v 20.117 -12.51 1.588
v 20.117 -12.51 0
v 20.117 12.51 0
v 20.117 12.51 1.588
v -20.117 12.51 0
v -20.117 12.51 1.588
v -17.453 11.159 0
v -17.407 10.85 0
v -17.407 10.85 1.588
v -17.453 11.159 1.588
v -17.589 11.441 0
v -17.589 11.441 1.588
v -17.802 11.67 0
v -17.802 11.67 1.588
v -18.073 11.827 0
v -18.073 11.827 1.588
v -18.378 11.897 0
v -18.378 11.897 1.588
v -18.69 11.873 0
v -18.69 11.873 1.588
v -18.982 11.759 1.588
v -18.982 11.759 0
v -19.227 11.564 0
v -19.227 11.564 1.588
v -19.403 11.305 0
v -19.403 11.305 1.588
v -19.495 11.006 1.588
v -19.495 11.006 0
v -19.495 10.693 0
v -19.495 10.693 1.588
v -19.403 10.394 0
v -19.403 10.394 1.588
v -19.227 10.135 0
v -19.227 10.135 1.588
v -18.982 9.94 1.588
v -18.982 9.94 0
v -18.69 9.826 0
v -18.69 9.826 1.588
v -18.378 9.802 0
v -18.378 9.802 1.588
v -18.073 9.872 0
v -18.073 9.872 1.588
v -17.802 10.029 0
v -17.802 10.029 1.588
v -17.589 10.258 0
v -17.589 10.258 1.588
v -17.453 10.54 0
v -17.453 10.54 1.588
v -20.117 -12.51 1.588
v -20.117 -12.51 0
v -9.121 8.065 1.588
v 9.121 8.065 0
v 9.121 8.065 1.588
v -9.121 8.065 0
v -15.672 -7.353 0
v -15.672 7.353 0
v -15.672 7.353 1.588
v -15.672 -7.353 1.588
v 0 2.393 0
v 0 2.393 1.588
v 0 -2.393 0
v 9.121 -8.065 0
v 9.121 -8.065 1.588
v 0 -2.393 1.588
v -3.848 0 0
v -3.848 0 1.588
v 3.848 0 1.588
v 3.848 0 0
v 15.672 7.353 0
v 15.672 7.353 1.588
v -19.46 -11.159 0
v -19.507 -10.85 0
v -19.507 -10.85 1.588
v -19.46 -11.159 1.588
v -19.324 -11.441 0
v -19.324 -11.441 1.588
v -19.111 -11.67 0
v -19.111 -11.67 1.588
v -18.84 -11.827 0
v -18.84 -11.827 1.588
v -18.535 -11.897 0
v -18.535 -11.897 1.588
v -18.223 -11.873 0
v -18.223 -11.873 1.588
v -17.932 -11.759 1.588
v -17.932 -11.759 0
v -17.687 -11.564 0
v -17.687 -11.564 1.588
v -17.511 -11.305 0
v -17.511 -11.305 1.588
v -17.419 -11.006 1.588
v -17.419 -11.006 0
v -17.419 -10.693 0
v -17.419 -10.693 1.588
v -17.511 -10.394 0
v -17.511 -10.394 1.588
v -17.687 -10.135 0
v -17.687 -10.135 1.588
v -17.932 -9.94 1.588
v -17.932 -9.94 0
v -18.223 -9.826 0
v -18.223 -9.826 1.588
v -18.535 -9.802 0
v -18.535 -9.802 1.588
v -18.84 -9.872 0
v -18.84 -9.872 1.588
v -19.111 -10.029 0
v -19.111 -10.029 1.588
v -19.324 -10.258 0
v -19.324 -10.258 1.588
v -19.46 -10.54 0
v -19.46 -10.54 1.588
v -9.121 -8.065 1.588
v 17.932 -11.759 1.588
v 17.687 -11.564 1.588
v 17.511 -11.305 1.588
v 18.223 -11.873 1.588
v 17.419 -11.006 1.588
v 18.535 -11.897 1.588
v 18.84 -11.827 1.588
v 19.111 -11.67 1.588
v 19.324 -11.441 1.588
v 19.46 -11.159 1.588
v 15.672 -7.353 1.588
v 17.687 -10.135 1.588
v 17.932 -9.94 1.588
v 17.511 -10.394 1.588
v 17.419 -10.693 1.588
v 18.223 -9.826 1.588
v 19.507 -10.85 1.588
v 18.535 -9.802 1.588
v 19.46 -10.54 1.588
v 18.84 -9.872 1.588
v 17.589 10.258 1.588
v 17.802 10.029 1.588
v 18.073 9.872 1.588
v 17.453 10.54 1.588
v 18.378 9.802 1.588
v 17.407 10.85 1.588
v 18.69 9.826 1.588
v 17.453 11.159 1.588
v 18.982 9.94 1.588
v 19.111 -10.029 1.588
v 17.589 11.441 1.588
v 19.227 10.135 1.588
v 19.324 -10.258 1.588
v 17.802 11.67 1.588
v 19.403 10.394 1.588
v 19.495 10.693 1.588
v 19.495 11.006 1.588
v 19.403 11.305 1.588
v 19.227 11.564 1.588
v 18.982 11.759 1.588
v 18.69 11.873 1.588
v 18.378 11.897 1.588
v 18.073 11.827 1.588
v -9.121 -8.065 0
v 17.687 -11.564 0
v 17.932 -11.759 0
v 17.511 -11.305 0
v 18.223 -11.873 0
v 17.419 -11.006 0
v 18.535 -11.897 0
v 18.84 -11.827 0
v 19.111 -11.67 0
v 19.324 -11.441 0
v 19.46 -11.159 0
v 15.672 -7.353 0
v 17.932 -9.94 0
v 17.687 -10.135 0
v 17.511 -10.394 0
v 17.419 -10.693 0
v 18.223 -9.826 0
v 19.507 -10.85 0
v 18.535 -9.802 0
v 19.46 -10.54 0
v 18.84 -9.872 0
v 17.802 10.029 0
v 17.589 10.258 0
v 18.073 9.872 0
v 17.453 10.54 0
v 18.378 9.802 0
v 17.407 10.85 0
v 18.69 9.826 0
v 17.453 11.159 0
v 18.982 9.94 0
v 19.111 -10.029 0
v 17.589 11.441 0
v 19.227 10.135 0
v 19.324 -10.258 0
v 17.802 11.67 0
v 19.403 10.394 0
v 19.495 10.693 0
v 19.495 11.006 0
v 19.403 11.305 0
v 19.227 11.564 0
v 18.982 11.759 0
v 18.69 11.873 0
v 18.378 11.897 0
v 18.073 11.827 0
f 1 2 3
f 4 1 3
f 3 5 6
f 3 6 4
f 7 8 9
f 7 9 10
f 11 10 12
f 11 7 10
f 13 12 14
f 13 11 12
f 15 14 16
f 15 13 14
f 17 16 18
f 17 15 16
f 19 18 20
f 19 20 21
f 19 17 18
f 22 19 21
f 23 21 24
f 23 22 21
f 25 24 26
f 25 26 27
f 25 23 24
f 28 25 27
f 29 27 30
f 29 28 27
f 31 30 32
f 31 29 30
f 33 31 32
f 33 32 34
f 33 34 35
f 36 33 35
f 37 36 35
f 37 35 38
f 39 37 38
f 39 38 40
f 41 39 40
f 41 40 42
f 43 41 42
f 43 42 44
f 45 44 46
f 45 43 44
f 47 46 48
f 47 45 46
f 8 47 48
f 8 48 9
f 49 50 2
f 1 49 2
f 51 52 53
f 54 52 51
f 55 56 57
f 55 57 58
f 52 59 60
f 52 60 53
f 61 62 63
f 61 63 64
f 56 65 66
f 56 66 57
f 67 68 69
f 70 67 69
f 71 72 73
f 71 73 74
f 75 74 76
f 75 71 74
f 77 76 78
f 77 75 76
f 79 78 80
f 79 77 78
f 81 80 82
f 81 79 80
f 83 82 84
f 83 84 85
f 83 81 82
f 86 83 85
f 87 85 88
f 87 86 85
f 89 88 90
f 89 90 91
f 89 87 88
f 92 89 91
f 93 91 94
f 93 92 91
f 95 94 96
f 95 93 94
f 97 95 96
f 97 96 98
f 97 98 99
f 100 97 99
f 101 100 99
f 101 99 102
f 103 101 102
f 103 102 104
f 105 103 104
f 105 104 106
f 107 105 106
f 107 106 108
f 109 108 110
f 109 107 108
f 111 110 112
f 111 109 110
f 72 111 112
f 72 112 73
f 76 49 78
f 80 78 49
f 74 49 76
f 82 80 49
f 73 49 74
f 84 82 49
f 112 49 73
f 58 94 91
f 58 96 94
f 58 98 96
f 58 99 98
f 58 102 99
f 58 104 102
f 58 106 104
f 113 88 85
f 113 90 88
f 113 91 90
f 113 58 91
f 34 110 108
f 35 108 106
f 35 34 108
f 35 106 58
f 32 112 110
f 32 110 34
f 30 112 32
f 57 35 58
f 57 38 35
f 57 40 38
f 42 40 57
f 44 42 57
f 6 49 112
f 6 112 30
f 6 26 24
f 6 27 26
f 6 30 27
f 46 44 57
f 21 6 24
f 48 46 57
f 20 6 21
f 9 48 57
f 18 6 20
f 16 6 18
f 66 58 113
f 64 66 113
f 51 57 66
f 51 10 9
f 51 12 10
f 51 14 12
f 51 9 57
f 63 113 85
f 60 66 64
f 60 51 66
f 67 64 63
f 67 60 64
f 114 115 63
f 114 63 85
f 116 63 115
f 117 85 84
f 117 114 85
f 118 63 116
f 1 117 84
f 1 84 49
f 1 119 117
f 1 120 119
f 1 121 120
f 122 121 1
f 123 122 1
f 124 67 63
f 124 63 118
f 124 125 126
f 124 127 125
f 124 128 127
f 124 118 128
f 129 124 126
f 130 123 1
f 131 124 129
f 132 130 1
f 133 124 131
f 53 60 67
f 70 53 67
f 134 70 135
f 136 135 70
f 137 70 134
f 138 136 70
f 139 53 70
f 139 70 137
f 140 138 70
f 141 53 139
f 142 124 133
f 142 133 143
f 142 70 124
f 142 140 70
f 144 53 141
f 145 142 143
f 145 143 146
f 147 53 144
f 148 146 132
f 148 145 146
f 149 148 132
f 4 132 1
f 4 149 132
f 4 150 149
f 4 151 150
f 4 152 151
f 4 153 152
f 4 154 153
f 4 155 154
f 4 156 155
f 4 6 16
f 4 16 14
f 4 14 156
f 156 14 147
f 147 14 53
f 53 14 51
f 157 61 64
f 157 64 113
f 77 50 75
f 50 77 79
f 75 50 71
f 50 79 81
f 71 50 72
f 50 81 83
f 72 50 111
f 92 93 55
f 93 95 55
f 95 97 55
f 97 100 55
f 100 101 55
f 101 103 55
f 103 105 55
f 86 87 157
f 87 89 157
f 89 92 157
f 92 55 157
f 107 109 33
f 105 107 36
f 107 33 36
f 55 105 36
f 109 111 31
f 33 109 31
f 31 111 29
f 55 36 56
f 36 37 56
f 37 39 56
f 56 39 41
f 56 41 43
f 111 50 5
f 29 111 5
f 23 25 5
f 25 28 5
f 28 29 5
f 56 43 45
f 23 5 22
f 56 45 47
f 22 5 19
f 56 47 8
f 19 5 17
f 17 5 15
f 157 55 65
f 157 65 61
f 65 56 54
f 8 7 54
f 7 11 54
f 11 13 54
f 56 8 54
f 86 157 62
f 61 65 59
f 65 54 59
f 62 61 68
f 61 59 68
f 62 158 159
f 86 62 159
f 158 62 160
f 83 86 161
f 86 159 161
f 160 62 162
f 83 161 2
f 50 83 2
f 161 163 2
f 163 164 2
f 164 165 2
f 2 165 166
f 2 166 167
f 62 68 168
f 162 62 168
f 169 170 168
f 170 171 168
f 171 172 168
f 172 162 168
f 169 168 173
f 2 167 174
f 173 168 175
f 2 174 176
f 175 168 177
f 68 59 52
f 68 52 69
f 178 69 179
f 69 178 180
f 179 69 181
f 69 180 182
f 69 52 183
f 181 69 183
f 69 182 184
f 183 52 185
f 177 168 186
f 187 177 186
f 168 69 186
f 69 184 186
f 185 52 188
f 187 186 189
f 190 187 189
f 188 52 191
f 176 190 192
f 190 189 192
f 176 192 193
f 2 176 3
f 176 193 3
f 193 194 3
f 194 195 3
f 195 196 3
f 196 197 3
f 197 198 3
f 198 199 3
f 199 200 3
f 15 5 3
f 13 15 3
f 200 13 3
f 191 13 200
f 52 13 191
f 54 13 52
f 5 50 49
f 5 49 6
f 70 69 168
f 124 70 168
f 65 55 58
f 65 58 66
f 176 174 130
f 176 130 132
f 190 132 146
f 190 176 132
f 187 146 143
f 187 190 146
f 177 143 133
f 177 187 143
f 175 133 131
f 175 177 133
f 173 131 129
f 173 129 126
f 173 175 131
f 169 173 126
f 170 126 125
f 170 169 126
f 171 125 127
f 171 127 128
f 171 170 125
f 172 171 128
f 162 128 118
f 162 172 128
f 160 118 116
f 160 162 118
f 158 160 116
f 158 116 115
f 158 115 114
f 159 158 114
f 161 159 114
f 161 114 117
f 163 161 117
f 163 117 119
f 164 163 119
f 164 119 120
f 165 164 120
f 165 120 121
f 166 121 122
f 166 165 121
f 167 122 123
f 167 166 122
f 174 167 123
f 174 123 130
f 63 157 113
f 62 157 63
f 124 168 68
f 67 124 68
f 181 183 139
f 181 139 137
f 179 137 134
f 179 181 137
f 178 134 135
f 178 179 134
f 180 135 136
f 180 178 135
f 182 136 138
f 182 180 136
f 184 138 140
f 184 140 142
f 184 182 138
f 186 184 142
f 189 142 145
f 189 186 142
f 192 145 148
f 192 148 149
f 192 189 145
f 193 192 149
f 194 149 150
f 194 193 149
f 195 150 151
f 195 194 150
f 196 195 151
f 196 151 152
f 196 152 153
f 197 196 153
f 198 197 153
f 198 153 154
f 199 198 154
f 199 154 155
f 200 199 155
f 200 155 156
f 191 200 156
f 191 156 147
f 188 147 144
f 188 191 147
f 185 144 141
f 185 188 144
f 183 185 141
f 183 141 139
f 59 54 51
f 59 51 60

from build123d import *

# Parameters (mm, degrees)
SKETCH2_W           = 40.2336
SKETCH2_H           = 25.019
SKETCH2_R           = 1.05
BOSS_EXTRUDE1_DEPTH = 1.5875


with BuildPart() as part:
    # Sketch2 → Boss-Extrude1 (new body)
    with BuildSketch(Plane.XY):
        Rectangle(SKETCH2_W, SKETCH2_H)
        with Locations((-18.4568, 10.8495)):
            Circle(SKETCH2_R, mode=Mode.SUBTRACT)
        with Locations(Location((-18.4568, -10.8495, 0), (0, 0, 180))):
            Circle(SKETCH2_R, mode=Mode.SUBTRACT)
        with Locations((18.4568, -10.8495)):
            Circle(SKETCH2_R, mode=Mode.SUBTRACT)
        with Locations(Location((18.4568, 10.8495, 0), (0, 0, 180))):
            Circle(SKETCH2_R, mode=Mode.SUBTRACT)
        Polygon((15.6718, -7.352568033), (3.847974859, 0), (15.6718, 7.352568033), align=None, mode=Mode.SUBTRACT)
        Polygon((9.120723619, -8.0645), (0, -2.392837901), (-9.120723619, -8.0645), align=None, mode=Mode.SUBTRACT)
        Polygon((9.120723619, 8.0645), (-9.120723619, 8.0645), (0, 2.392837901), align=None, mode=Mode.SUBTRACT)
        Polygon((-15.6718, 7.352568033), (-15.6718, -7.352568033), (-3.847974859, 0), align=None, mode=Mode.SUBTRACT)
    extrude(amount=BOSS_EXTRUDE1_DEPTH)


solid = part.part
